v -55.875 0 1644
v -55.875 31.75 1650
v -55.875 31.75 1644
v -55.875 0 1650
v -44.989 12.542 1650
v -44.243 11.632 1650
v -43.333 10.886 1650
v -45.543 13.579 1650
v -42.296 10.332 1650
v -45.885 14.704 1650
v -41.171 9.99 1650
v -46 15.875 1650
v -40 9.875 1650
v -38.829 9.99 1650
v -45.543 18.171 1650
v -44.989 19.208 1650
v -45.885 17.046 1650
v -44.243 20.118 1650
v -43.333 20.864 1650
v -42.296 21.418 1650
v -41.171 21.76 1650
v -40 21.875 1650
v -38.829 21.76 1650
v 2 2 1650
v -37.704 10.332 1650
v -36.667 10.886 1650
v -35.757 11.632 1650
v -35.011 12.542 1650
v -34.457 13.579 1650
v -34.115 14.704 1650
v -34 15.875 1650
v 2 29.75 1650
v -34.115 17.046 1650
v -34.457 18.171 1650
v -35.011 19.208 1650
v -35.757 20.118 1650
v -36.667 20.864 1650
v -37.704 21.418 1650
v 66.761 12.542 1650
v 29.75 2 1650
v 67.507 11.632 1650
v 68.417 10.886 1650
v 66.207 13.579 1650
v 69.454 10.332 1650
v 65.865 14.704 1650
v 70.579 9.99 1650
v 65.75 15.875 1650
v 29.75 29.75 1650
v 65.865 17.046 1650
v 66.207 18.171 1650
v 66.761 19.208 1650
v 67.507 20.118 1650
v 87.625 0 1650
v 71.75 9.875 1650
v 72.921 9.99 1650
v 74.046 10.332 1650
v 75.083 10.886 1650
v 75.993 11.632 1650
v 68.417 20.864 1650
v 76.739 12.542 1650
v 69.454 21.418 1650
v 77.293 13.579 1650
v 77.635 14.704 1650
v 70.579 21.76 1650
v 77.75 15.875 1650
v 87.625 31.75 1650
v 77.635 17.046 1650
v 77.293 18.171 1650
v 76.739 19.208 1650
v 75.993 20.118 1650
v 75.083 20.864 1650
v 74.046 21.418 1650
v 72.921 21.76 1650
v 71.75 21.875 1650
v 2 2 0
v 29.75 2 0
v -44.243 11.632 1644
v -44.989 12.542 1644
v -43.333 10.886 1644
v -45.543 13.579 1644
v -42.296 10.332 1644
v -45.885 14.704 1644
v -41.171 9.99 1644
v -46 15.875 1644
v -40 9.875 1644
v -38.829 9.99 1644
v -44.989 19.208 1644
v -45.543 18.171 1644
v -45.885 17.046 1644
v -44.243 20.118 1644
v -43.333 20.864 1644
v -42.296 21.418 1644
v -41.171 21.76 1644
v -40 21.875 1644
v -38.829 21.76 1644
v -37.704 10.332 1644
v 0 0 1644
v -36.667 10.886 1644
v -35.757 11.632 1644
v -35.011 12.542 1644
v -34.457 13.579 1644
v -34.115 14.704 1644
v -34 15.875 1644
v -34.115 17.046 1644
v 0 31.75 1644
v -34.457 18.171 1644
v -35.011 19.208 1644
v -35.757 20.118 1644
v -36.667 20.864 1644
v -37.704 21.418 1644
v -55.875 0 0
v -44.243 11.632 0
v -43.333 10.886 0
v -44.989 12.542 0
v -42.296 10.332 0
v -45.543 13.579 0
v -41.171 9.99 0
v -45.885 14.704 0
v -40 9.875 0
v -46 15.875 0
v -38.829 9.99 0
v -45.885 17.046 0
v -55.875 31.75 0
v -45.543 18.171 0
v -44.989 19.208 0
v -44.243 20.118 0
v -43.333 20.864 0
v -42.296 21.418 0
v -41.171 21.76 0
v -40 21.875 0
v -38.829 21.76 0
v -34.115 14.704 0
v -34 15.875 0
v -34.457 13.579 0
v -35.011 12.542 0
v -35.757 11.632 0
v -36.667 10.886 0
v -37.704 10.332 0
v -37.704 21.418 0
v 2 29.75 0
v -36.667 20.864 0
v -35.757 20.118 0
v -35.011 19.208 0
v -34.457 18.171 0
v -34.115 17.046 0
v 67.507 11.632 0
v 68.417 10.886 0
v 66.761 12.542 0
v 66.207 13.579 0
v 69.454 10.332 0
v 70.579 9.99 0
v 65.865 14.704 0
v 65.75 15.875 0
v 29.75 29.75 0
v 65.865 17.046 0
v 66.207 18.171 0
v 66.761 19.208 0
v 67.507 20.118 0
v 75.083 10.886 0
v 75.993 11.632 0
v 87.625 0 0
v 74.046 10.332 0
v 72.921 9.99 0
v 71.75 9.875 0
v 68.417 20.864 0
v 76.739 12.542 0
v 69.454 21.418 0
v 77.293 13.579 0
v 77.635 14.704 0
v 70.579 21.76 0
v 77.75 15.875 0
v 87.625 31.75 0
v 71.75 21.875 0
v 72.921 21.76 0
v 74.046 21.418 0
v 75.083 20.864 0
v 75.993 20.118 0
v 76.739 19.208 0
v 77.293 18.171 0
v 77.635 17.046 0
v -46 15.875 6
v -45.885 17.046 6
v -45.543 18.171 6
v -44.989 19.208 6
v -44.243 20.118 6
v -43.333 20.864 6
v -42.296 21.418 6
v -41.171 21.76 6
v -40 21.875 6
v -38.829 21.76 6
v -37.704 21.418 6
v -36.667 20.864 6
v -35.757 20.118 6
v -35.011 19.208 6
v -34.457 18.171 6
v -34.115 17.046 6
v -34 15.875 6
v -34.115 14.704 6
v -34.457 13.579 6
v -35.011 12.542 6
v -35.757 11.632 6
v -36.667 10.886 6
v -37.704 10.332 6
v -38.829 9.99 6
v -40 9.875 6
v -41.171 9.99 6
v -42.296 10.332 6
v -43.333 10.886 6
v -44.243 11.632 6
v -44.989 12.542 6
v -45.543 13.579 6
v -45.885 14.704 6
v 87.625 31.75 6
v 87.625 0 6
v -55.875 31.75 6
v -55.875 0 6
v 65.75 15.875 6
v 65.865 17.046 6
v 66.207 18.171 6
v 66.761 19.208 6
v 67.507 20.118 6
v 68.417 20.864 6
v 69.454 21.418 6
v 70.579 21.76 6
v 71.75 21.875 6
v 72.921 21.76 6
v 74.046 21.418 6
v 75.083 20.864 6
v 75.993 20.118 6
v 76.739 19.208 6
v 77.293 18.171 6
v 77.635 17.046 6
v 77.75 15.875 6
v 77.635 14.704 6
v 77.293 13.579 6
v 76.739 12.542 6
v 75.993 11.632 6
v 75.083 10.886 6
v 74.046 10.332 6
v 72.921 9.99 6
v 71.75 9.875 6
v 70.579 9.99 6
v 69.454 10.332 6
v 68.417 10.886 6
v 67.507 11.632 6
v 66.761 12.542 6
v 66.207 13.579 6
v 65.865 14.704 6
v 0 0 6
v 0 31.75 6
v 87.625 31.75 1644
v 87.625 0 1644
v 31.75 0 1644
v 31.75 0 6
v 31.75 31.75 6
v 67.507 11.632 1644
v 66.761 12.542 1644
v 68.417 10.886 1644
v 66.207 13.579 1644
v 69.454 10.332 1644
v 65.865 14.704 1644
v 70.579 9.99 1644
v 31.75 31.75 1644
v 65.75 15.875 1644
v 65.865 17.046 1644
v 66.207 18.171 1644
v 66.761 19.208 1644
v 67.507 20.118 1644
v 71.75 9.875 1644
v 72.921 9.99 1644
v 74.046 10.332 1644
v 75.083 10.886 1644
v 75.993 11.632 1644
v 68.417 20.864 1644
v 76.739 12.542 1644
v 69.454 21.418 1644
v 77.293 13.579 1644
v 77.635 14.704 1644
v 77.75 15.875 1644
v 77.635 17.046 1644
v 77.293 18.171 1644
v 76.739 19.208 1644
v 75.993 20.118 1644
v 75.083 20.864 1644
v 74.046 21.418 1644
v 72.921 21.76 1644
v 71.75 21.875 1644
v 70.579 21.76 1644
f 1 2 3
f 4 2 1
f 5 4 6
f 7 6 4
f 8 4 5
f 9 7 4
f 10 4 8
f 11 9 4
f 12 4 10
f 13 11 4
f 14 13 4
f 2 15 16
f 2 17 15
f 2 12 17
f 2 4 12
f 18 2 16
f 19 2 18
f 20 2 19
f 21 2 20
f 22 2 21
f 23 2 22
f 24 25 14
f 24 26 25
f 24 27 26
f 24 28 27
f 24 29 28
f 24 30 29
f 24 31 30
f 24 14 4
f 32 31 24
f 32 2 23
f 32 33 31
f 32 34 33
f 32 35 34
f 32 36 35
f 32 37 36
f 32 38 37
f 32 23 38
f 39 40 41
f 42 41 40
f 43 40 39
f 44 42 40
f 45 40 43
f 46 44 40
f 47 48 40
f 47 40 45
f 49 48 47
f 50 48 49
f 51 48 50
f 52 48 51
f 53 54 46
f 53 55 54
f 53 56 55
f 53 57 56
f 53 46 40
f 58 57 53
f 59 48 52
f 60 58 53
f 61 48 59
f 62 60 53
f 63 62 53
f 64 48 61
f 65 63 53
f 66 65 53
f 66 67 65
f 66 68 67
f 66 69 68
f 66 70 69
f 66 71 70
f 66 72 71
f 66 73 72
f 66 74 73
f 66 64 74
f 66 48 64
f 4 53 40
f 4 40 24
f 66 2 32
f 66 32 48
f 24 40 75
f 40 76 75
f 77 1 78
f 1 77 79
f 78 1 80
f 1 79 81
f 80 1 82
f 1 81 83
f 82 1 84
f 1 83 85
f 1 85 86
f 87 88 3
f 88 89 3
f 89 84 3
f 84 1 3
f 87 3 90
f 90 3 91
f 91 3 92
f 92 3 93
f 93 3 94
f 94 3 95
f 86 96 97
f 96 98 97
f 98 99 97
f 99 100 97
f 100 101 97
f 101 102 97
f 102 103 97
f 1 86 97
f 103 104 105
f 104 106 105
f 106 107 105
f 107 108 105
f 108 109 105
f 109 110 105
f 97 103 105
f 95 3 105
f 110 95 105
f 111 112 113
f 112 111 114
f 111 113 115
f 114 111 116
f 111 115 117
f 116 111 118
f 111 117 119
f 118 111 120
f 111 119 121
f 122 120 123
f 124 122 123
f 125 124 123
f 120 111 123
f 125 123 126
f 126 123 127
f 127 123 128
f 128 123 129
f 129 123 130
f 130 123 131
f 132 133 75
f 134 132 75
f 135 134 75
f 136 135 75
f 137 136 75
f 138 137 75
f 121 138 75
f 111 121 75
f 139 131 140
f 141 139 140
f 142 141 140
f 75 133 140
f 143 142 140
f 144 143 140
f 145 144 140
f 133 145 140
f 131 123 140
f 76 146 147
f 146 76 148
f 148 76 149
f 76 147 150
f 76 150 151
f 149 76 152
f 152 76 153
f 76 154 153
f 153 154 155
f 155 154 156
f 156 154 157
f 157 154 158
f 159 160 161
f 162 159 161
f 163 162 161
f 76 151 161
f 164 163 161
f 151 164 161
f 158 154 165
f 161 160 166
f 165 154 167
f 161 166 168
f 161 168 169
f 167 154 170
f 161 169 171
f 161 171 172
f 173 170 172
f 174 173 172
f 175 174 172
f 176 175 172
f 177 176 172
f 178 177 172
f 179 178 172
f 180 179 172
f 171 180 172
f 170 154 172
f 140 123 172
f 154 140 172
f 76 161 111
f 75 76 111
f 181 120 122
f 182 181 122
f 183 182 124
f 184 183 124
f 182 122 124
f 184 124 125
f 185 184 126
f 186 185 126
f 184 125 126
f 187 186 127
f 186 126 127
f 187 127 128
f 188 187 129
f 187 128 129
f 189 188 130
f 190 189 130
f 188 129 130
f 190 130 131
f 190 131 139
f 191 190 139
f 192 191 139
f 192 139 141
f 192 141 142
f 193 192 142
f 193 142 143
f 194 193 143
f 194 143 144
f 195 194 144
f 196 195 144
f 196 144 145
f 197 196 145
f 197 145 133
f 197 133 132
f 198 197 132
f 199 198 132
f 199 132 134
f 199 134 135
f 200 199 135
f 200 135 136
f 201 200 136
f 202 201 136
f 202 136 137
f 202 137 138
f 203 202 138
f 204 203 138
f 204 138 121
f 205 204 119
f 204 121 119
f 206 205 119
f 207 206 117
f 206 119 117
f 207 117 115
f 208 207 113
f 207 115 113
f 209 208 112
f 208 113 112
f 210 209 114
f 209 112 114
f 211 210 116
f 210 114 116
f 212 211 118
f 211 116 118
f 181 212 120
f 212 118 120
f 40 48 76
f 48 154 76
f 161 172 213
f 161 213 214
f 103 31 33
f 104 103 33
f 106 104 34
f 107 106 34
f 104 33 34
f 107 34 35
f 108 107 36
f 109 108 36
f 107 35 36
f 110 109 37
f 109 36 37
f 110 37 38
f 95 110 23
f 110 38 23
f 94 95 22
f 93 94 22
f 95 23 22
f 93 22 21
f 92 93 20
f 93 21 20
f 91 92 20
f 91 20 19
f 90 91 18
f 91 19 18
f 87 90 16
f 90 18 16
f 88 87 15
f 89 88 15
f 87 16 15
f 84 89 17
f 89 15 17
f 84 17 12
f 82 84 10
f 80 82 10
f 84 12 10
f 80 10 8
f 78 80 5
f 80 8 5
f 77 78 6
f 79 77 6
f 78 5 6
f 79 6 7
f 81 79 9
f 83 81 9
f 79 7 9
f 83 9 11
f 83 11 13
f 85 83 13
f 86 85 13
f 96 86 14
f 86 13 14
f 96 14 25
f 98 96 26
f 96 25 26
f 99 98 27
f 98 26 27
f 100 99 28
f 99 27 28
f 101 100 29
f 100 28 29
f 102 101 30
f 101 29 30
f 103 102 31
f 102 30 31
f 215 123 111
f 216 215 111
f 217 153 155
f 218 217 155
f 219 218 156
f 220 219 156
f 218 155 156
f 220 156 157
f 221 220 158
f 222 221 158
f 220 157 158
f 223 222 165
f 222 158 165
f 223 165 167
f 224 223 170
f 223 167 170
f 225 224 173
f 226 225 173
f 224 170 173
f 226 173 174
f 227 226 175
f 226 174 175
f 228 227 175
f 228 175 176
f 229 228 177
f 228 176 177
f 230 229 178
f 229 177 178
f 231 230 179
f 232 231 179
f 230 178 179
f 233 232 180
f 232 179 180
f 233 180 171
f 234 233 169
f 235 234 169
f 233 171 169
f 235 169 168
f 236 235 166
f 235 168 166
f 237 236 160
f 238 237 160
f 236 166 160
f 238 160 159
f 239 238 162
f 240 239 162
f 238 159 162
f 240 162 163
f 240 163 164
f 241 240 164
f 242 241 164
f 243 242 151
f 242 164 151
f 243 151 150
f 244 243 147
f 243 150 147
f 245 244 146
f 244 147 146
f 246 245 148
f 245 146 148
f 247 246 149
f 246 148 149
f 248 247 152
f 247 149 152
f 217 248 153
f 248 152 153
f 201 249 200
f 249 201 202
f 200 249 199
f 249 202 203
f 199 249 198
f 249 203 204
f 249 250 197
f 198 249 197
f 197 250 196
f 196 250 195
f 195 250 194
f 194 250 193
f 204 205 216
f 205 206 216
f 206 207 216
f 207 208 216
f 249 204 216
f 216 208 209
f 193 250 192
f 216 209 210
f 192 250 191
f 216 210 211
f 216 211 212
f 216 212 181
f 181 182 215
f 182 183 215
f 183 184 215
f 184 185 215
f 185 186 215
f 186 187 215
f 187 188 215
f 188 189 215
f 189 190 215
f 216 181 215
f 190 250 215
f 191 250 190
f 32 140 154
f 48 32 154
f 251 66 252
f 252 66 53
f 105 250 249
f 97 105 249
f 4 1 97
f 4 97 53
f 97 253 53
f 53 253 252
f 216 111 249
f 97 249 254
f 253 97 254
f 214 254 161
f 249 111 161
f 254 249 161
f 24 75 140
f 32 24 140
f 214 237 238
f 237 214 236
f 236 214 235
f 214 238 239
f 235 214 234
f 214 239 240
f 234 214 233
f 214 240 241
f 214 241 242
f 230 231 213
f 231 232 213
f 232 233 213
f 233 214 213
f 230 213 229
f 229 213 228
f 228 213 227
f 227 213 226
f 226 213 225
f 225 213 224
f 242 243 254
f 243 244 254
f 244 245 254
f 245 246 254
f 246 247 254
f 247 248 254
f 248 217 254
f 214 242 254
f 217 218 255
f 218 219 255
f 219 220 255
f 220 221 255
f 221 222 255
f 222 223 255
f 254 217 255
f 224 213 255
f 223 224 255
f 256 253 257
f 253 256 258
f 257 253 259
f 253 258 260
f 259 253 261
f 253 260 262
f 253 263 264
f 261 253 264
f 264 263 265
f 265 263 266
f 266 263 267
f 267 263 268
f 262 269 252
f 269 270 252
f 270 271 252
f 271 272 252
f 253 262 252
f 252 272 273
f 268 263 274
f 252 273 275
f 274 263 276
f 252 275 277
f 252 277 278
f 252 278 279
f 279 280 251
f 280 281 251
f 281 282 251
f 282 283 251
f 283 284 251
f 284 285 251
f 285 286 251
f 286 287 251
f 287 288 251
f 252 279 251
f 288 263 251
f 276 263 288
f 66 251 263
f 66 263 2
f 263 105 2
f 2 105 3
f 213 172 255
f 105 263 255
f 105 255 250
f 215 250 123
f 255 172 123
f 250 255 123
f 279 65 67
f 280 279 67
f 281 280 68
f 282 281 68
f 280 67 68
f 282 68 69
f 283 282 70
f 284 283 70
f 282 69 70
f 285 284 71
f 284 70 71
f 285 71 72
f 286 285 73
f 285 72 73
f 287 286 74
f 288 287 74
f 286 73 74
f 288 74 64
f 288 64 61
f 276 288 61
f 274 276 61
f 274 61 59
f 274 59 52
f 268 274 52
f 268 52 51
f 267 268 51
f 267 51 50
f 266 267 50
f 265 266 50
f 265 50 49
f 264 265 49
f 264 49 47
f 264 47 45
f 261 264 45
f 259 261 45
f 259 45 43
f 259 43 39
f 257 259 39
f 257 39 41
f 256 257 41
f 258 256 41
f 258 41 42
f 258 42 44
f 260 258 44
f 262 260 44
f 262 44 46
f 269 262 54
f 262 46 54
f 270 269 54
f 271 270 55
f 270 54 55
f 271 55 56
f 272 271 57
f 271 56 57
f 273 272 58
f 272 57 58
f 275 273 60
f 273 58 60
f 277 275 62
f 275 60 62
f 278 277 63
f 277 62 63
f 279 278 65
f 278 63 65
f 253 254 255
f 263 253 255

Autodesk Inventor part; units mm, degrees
ref_plane "YZ Plane" through (0, 0, 0) normal (1, 0, 0) x (0, 1, 0)
ref_plane "XZ Plane" through (0, 0, 0) normal (0, 1, 0) x (-1, 0, 0)
ref_plane "XY Plane" through (0, 0, 0) normal (0, 0, 1) x (1, 0, 0)
sketch "Sketch2" plane through (0, 0, 0) normal (0, 0, 1) x (1, 0, 0)
  line L0 (0, 0) -> (31.75, 0)
  line L1 (31.75, 0) -> (31.75, 31.75)
  line L2 (31.75, 31.75) -> (0, 31.75)
  line L3 (0, 31.75) -> (0, 0)
  line L4 (2, 29.75) -> (29.75, 29.75)
  line L5 (29.75, 29.75) -> (29.75, 2)
  line L6 (29.75, 2) -> (2, 2)
  line L7 (2, 2) -> (2, 29.75)
  dimension "d0" = 31.75
  dimension "d1" = 31.75
  dimension "d2" = 2
extrude "Extrusion1" add sketch "Sketch2" along normal blind 1650
sketch "Sketch3" plane through (0, 0, 1650) normal (0, 0, 1) x (1, 0, 0)
  line L0 (31.75, 31.75) -> (0, 31.75) projected
  line L1 (0, 31.75) -> (-55.875, 31.75)
  line L2 (-55.875, 31.75) -> (-55.875, 0)
  line L3 (-55.875, 0) -> (0, 0)
  line L4 (0, 0) -> (0, 31.75)
  line L5 (31.75, 31.75) -> (87.625, 31.75)
  line L6 (87.625, 31.75) -> (87.625, 0)
  line L7 (87.625, 0) -> (31.75, 0)
  line L8 (31.75, 0) -> (31.75, 31.75)
  circle A0 centre (-40, 15.875) radius 6
  circle A1 centre (71.75, 15.875) radius 6
  dimension "d5" = 55.875
  dimension "d6" = 55.875
  dimension "d7" = 12
  dimension "d8" = 12
  dimension "d15" = 111.75
  dimension "d16" = 40
extrude "Extrusion2" add sketch "Sketch3" against normal blind 6
sketch "Sketch4" plane through (0, 0, 0) normal (0, 0, -1) x (-1, 0, 0)
  line L0 (-87.625, 31.75) -> (55.875, 31.75) projected
  line L1 (55.875, 0) -> (-87.625, 0) projected
  line L2 (40, 31.75) -> (55.875, 31.75)
  line L3 (55.875, 31.75) -> (55.875, 0)
  line L4 (55.875, 0) -> (25.875, 0)
  line L5 (-31.75, 31.75) -> (-31.75, 0) projected
  line L6 (-31.75, 31.75) -> (-87.625, 31.75)
  line L7 (-87.625, 31.75) -> (-87.625, 0)
  line L8 (-87.625, 0) -> (-31.75, 0)
  line L9 (-31.75, 0) -> (-31.75, 31.75)
  circle A0 centre (-71.75, 15.875) radius 6 projected
  circle A1 centre (-71.75, 15.875) radius 6
  circle A2 centre (40, 15.875) radius 6
  line L10 (0, 31.75) -> (0, 0)
  point P0 (55.875, 31.75)
  point P1 (-87.625, 31.75)
  point P2 (-87.625, 0)
  point P3 (-87.625, 0)
  dimension "d11" = 55.875
  dimension "d12" = 12
  dimension "d17" = 40
  dimension "d18" = 111.75
extrude "Extrusion3" add sketch "Sketch4" against normal blind 6 contours L0 L5 L1 L7 | L0 L3 L1 L10
properties part number "Bases_MDF_Acero"
